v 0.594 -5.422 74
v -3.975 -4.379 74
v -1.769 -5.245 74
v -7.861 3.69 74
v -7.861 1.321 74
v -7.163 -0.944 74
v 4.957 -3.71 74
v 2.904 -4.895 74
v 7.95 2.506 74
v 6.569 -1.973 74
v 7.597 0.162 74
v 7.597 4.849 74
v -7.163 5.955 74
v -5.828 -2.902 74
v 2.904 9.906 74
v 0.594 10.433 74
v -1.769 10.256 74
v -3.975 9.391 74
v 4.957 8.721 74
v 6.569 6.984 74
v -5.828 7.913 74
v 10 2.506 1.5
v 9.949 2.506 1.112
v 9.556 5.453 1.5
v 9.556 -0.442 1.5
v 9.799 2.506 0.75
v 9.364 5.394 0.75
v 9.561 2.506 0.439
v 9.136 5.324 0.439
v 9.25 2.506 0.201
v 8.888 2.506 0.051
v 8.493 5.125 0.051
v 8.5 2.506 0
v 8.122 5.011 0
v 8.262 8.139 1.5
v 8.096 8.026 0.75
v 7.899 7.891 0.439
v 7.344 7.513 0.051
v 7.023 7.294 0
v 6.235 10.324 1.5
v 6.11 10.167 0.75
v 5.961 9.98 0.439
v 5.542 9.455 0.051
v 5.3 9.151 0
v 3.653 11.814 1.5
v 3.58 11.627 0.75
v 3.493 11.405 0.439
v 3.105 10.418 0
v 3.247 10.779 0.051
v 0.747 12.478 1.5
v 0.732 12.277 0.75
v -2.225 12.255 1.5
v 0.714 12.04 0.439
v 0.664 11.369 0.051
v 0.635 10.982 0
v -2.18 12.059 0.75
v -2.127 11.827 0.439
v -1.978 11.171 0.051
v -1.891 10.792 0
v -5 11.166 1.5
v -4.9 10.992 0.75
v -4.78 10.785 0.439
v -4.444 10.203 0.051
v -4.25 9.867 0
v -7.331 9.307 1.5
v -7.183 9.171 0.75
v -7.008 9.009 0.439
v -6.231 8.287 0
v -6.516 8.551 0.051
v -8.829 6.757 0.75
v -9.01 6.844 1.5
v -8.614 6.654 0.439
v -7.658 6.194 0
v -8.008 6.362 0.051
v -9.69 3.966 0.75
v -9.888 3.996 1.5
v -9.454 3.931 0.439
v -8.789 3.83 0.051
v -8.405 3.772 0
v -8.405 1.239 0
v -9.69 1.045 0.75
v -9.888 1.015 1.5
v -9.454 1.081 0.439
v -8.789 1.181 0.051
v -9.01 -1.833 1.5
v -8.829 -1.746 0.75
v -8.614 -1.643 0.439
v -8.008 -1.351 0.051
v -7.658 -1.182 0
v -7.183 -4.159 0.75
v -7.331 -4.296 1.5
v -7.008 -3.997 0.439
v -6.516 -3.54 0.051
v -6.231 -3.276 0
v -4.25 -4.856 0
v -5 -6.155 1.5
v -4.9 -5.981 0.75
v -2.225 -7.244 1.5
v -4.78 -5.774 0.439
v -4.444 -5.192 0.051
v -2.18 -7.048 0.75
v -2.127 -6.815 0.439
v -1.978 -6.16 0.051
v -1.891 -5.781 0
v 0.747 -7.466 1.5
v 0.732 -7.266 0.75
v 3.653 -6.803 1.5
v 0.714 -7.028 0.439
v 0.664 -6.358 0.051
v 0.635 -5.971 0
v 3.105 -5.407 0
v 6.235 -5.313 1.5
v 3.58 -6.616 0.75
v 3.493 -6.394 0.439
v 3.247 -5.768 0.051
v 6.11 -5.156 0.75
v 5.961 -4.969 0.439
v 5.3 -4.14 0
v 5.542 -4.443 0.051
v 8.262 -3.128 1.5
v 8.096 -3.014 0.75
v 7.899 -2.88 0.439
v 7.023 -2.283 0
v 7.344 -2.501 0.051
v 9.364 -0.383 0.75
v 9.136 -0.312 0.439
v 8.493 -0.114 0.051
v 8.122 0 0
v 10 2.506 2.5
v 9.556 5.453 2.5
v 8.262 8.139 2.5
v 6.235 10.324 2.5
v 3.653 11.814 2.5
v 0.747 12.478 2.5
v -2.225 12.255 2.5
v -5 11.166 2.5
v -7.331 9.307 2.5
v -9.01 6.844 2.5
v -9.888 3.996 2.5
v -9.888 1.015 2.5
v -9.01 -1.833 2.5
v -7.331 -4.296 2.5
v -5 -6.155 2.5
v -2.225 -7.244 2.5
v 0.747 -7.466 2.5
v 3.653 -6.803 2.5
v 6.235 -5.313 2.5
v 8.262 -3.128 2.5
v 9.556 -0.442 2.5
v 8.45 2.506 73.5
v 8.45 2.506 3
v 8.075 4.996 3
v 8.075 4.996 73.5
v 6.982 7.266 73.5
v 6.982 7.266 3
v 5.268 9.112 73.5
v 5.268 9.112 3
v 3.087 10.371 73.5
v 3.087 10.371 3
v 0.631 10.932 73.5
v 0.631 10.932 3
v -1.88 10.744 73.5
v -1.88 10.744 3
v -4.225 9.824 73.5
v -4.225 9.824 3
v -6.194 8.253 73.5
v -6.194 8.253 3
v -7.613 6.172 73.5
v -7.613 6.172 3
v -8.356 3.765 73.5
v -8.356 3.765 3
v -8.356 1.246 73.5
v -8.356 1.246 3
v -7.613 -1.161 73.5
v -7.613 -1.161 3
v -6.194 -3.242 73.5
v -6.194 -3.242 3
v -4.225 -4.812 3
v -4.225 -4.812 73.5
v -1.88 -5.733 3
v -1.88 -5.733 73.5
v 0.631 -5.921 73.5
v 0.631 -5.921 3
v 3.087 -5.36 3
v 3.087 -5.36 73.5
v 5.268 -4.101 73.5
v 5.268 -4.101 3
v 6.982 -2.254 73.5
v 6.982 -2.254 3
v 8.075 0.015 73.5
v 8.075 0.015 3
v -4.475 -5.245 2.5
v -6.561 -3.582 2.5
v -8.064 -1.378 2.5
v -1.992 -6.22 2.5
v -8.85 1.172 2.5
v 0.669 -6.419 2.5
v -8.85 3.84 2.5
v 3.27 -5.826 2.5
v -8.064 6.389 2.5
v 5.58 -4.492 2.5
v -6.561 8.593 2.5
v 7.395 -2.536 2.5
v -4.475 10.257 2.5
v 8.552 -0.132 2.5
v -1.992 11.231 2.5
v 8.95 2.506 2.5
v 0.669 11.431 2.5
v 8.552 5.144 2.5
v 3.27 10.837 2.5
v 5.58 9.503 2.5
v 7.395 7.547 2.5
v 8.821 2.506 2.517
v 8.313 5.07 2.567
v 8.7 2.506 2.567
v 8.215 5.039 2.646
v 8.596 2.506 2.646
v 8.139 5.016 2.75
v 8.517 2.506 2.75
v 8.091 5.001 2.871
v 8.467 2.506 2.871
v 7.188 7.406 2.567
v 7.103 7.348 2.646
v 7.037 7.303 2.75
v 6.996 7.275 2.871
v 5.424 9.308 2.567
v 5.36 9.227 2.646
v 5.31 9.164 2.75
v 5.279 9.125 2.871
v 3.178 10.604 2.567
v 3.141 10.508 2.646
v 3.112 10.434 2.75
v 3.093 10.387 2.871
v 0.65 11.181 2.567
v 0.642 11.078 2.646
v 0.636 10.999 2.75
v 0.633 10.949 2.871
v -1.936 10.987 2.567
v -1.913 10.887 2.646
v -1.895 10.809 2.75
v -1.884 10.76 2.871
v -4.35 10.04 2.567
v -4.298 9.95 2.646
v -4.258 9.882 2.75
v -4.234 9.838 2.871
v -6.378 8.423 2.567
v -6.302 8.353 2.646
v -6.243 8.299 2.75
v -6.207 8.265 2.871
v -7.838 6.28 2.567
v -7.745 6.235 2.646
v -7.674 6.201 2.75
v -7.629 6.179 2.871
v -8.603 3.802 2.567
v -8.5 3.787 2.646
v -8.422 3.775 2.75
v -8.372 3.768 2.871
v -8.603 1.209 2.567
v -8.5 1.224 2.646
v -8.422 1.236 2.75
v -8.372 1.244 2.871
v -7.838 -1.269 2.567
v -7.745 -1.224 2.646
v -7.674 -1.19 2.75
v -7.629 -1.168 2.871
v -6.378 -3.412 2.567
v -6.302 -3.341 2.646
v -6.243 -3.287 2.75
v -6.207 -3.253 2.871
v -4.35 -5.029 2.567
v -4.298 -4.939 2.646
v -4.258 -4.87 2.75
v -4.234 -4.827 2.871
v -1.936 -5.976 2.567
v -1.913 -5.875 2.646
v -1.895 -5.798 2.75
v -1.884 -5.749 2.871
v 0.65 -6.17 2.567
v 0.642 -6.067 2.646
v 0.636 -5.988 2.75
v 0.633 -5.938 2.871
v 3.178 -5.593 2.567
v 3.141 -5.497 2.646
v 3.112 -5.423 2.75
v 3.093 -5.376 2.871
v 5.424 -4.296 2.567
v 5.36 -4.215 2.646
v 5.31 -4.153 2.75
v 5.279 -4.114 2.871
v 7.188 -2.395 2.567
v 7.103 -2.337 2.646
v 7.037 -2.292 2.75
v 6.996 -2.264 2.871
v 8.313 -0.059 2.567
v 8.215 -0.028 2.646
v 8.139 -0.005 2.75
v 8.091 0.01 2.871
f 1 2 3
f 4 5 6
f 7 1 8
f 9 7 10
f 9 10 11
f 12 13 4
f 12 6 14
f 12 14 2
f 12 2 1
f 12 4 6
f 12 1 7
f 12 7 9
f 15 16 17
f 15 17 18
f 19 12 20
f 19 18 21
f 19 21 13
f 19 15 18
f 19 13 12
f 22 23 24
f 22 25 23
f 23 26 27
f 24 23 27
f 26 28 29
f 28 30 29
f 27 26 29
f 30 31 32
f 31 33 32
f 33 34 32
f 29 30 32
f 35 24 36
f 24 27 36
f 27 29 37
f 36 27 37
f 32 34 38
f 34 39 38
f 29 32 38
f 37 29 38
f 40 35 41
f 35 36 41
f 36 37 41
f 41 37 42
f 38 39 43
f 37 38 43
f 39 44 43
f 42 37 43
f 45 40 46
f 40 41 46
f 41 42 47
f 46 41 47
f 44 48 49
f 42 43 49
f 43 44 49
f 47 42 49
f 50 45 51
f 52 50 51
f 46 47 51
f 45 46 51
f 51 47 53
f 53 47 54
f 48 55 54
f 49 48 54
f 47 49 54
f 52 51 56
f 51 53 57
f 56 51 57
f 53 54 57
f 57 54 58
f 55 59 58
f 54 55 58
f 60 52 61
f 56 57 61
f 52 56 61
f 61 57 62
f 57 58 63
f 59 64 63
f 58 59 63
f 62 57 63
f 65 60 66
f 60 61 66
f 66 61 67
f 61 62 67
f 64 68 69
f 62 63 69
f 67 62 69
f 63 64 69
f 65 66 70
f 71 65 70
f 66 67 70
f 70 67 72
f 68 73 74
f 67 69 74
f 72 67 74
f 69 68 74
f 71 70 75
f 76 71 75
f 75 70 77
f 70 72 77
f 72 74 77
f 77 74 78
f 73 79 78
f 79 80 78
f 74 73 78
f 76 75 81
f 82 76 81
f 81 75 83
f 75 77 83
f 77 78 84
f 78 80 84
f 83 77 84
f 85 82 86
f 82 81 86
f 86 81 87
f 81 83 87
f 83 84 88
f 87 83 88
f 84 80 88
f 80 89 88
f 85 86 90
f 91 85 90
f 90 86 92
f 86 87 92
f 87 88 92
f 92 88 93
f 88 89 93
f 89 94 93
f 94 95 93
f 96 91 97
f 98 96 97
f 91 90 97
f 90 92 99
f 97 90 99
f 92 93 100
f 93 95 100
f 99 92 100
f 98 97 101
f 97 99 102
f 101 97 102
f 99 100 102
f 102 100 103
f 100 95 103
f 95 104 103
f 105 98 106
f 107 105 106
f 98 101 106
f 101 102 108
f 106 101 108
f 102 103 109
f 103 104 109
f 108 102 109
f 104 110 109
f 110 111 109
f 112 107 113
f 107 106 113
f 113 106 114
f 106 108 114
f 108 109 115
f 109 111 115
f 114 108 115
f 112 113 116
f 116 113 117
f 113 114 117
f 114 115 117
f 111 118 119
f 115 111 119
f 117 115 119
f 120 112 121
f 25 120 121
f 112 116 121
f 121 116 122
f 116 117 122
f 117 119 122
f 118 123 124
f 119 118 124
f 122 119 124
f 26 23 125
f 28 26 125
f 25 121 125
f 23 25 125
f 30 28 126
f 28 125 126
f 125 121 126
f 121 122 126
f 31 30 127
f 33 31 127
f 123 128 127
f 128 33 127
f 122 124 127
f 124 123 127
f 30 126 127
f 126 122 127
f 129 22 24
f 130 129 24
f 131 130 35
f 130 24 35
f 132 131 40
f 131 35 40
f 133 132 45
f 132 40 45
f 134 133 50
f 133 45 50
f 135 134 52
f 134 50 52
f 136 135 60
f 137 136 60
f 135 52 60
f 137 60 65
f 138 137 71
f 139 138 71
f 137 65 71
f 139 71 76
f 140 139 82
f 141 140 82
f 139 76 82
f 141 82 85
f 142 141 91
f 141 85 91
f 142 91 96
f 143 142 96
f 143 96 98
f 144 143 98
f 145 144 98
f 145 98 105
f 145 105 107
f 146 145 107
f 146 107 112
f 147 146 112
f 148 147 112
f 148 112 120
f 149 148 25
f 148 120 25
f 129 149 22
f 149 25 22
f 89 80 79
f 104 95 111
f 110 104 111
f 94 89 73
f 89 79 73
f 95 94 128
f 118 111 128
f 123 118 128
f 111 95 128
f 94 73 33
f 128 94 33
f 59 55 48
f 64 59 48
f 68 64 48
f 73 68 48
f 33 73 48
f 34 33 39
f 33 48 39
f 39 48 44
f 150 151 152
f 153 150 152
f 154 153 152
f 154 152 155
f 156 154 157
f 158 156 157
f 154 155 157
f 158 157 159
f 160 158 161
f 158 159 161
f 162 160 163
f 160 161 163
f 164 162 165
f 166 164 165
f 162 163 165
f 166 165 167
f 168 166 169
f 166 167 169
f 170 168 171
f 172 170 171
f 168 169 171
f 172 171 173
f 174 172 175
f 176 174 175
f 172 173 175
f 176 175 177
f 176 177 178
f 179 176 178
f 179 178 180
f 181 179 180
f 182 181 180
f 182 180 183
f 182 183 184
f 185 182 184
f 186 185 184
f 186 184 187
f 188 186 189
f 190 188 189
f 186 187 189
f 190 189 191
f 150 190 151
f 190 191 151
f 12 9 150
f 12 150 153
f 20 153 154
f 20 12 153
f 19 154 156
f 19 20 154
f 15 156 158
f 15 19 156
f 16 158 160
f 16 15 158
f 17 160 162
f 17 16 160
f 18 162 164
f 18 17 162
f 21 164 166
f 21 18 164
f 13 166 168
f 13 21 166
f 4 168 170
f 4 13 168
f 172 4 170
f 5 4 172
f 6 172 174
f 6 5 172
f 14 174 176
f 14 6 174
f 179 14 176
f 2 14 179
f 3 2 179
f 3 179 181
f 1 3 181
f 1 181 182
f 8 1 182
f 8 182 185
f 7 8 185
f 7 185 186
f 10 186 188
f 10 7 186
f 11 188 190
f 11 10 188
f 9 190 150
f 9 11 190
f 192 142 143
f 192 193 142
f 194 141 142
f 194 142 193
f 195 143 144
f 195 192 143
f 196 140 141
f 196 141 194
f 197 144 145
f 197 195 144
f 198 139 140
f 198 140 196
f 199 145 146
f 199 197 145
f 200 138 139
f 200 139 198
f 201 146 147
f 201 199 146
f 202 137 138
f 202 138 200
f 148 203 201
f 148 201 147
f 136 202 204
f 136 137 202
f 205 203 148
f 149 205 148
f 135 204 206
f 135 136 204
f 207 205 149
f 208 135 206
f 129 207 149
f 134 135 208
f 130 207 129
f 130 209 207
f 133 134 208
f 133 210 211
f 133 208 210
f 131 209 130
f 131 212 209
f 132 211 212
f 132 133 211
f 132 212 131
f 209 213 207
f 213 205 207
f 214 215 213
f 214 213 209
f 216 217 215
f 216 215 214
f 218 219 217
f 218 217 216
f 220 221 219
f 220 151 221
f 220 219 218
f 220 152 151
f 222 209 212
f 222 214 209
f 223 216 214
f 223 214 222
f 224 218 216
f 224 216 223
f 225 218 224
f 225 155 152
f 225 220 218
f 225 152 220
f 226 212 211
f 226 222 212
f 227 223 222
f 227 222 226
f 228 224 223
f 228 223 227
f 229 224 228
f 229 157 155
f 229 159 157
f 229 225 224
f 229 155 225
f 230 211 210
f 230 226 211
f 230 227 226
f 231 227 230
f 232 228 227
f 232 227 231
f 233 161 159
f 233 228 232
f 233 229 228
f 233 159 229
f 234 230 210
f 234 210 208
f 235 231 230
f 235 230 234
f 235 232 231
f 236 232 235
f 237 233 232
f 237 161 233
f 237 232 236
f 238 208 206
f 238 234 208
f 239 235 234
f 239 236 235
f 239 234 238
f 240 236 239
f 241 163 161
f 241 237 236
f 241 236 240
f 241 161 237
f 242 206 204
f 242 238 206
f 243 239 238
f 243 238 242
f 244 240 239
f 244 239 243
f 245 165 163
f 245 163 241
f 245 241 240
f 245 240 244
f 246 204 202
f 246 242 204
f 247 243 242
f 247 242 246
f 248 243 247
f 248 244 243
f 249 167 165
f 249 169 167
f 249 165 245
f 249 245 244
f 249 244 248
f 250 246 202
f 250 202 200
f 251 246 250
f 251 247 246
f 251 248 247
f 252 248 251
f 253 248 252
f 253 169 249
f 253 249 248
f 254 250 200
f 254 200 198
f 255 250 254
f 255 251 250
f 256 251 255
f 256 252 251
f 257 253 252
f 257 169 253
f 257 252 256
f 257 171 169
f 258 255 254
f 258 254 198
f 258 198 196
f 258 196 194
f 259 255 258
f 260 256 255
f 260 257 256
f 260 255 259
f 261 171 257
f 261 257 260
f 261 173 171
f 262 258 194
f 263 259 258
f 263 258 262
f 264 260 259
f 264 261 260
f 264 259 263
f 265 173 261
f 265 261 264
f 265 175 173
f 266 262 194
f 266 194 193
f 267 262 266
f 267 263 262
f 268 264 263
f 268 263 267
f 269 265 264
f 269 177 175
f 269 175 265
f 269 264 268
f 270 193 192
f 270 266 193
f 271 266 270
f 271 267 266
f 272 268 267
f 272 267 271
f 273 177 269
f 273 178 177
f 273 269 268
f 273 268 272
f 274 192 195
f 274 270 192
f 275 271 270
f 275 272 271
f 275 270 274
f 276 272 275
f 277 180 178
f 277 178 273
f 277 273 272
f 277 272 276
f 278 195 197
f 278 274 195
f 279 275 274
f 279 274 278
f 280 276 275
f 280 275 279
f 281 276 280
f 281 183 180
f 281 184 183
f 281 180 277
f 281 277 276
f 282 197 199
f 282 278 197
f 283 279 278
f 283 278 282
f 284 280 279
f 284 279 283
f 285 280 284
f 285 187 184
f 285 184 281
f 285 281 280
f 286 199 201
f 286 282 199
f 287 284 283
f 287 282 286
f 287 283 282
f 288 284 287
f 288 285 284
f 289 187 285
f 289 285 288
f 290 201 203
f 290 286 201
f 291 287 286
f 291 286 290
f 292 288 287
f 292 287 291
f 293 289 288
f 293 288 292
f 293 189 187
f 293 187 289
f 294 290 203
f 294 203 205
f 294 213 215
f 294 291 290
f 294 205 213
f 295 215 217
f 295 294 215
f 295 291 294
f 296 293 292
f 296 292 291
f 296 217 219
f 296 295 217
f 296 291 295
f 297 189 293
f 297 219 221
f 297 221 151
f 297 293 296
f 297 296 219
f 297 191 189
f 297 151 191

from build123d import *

# Parameters (mm, degrees)
SCHIZZO1_R                   = 10
ESTRUSIONE_ESTRUSIONE1_DEPTH = 2.5
SCHIZZO2_R                   = 8.45
ESTRUSIONE_ESTRUSIONE2_DEPTH = 71.5
RACCORDO1_R                  = 0.5
SMUSSO2_SIZE                 = 0.5
RACCORDO3_R                  = 1.5


with BuildPart() as part:
    # Schizzo1 → Estrusione-Estrusione1 (new body)
    with BuildSketch(Plane.XY):
        with Locations((0, 2.505612013)):
            Circle(SCHIZZO1_R)
    extrude(amount=ESTRUSIONE_ESTRUSIONE1_DEPTH)

    # Schizzo2 → Estrusione-Estrusione2 (add)
    with BuildSketch(Plane.XY.offset(2.5)):
        with Locations((0, 2.505612013)):
            Circle(SCHIZZO2_R)
    extrude(amount=ESTRUSIONE_ESTRUSIONE2_DEPTH)

    # Raccordo1
    raccordo1_edges = [part.edges().sort_by_distance(p)[0] for p in [
        (-8.45, 2.505612013, 2.5),
    ]]
    fillet(raccordo1_edges, radius=RACCORDO1_R)

    # Smusso2
    smusso2_edges = [part.edges().sort_by_distance(p)[0] for p in [
        (-8.45, 2.505612013, 74),
    ]]
    chamfer(smusso2_edges, length=SMUSSO2_SIZE)

    # Raccordo3
    raccordo3_edges = [part.edges().sort_by_distance(p)[0] for p in [
        (-10, 2.505612013, 0),
    ]]
    fillet(raccordo3_edges, radius=RACCORDO3_R)


solid = part.part
